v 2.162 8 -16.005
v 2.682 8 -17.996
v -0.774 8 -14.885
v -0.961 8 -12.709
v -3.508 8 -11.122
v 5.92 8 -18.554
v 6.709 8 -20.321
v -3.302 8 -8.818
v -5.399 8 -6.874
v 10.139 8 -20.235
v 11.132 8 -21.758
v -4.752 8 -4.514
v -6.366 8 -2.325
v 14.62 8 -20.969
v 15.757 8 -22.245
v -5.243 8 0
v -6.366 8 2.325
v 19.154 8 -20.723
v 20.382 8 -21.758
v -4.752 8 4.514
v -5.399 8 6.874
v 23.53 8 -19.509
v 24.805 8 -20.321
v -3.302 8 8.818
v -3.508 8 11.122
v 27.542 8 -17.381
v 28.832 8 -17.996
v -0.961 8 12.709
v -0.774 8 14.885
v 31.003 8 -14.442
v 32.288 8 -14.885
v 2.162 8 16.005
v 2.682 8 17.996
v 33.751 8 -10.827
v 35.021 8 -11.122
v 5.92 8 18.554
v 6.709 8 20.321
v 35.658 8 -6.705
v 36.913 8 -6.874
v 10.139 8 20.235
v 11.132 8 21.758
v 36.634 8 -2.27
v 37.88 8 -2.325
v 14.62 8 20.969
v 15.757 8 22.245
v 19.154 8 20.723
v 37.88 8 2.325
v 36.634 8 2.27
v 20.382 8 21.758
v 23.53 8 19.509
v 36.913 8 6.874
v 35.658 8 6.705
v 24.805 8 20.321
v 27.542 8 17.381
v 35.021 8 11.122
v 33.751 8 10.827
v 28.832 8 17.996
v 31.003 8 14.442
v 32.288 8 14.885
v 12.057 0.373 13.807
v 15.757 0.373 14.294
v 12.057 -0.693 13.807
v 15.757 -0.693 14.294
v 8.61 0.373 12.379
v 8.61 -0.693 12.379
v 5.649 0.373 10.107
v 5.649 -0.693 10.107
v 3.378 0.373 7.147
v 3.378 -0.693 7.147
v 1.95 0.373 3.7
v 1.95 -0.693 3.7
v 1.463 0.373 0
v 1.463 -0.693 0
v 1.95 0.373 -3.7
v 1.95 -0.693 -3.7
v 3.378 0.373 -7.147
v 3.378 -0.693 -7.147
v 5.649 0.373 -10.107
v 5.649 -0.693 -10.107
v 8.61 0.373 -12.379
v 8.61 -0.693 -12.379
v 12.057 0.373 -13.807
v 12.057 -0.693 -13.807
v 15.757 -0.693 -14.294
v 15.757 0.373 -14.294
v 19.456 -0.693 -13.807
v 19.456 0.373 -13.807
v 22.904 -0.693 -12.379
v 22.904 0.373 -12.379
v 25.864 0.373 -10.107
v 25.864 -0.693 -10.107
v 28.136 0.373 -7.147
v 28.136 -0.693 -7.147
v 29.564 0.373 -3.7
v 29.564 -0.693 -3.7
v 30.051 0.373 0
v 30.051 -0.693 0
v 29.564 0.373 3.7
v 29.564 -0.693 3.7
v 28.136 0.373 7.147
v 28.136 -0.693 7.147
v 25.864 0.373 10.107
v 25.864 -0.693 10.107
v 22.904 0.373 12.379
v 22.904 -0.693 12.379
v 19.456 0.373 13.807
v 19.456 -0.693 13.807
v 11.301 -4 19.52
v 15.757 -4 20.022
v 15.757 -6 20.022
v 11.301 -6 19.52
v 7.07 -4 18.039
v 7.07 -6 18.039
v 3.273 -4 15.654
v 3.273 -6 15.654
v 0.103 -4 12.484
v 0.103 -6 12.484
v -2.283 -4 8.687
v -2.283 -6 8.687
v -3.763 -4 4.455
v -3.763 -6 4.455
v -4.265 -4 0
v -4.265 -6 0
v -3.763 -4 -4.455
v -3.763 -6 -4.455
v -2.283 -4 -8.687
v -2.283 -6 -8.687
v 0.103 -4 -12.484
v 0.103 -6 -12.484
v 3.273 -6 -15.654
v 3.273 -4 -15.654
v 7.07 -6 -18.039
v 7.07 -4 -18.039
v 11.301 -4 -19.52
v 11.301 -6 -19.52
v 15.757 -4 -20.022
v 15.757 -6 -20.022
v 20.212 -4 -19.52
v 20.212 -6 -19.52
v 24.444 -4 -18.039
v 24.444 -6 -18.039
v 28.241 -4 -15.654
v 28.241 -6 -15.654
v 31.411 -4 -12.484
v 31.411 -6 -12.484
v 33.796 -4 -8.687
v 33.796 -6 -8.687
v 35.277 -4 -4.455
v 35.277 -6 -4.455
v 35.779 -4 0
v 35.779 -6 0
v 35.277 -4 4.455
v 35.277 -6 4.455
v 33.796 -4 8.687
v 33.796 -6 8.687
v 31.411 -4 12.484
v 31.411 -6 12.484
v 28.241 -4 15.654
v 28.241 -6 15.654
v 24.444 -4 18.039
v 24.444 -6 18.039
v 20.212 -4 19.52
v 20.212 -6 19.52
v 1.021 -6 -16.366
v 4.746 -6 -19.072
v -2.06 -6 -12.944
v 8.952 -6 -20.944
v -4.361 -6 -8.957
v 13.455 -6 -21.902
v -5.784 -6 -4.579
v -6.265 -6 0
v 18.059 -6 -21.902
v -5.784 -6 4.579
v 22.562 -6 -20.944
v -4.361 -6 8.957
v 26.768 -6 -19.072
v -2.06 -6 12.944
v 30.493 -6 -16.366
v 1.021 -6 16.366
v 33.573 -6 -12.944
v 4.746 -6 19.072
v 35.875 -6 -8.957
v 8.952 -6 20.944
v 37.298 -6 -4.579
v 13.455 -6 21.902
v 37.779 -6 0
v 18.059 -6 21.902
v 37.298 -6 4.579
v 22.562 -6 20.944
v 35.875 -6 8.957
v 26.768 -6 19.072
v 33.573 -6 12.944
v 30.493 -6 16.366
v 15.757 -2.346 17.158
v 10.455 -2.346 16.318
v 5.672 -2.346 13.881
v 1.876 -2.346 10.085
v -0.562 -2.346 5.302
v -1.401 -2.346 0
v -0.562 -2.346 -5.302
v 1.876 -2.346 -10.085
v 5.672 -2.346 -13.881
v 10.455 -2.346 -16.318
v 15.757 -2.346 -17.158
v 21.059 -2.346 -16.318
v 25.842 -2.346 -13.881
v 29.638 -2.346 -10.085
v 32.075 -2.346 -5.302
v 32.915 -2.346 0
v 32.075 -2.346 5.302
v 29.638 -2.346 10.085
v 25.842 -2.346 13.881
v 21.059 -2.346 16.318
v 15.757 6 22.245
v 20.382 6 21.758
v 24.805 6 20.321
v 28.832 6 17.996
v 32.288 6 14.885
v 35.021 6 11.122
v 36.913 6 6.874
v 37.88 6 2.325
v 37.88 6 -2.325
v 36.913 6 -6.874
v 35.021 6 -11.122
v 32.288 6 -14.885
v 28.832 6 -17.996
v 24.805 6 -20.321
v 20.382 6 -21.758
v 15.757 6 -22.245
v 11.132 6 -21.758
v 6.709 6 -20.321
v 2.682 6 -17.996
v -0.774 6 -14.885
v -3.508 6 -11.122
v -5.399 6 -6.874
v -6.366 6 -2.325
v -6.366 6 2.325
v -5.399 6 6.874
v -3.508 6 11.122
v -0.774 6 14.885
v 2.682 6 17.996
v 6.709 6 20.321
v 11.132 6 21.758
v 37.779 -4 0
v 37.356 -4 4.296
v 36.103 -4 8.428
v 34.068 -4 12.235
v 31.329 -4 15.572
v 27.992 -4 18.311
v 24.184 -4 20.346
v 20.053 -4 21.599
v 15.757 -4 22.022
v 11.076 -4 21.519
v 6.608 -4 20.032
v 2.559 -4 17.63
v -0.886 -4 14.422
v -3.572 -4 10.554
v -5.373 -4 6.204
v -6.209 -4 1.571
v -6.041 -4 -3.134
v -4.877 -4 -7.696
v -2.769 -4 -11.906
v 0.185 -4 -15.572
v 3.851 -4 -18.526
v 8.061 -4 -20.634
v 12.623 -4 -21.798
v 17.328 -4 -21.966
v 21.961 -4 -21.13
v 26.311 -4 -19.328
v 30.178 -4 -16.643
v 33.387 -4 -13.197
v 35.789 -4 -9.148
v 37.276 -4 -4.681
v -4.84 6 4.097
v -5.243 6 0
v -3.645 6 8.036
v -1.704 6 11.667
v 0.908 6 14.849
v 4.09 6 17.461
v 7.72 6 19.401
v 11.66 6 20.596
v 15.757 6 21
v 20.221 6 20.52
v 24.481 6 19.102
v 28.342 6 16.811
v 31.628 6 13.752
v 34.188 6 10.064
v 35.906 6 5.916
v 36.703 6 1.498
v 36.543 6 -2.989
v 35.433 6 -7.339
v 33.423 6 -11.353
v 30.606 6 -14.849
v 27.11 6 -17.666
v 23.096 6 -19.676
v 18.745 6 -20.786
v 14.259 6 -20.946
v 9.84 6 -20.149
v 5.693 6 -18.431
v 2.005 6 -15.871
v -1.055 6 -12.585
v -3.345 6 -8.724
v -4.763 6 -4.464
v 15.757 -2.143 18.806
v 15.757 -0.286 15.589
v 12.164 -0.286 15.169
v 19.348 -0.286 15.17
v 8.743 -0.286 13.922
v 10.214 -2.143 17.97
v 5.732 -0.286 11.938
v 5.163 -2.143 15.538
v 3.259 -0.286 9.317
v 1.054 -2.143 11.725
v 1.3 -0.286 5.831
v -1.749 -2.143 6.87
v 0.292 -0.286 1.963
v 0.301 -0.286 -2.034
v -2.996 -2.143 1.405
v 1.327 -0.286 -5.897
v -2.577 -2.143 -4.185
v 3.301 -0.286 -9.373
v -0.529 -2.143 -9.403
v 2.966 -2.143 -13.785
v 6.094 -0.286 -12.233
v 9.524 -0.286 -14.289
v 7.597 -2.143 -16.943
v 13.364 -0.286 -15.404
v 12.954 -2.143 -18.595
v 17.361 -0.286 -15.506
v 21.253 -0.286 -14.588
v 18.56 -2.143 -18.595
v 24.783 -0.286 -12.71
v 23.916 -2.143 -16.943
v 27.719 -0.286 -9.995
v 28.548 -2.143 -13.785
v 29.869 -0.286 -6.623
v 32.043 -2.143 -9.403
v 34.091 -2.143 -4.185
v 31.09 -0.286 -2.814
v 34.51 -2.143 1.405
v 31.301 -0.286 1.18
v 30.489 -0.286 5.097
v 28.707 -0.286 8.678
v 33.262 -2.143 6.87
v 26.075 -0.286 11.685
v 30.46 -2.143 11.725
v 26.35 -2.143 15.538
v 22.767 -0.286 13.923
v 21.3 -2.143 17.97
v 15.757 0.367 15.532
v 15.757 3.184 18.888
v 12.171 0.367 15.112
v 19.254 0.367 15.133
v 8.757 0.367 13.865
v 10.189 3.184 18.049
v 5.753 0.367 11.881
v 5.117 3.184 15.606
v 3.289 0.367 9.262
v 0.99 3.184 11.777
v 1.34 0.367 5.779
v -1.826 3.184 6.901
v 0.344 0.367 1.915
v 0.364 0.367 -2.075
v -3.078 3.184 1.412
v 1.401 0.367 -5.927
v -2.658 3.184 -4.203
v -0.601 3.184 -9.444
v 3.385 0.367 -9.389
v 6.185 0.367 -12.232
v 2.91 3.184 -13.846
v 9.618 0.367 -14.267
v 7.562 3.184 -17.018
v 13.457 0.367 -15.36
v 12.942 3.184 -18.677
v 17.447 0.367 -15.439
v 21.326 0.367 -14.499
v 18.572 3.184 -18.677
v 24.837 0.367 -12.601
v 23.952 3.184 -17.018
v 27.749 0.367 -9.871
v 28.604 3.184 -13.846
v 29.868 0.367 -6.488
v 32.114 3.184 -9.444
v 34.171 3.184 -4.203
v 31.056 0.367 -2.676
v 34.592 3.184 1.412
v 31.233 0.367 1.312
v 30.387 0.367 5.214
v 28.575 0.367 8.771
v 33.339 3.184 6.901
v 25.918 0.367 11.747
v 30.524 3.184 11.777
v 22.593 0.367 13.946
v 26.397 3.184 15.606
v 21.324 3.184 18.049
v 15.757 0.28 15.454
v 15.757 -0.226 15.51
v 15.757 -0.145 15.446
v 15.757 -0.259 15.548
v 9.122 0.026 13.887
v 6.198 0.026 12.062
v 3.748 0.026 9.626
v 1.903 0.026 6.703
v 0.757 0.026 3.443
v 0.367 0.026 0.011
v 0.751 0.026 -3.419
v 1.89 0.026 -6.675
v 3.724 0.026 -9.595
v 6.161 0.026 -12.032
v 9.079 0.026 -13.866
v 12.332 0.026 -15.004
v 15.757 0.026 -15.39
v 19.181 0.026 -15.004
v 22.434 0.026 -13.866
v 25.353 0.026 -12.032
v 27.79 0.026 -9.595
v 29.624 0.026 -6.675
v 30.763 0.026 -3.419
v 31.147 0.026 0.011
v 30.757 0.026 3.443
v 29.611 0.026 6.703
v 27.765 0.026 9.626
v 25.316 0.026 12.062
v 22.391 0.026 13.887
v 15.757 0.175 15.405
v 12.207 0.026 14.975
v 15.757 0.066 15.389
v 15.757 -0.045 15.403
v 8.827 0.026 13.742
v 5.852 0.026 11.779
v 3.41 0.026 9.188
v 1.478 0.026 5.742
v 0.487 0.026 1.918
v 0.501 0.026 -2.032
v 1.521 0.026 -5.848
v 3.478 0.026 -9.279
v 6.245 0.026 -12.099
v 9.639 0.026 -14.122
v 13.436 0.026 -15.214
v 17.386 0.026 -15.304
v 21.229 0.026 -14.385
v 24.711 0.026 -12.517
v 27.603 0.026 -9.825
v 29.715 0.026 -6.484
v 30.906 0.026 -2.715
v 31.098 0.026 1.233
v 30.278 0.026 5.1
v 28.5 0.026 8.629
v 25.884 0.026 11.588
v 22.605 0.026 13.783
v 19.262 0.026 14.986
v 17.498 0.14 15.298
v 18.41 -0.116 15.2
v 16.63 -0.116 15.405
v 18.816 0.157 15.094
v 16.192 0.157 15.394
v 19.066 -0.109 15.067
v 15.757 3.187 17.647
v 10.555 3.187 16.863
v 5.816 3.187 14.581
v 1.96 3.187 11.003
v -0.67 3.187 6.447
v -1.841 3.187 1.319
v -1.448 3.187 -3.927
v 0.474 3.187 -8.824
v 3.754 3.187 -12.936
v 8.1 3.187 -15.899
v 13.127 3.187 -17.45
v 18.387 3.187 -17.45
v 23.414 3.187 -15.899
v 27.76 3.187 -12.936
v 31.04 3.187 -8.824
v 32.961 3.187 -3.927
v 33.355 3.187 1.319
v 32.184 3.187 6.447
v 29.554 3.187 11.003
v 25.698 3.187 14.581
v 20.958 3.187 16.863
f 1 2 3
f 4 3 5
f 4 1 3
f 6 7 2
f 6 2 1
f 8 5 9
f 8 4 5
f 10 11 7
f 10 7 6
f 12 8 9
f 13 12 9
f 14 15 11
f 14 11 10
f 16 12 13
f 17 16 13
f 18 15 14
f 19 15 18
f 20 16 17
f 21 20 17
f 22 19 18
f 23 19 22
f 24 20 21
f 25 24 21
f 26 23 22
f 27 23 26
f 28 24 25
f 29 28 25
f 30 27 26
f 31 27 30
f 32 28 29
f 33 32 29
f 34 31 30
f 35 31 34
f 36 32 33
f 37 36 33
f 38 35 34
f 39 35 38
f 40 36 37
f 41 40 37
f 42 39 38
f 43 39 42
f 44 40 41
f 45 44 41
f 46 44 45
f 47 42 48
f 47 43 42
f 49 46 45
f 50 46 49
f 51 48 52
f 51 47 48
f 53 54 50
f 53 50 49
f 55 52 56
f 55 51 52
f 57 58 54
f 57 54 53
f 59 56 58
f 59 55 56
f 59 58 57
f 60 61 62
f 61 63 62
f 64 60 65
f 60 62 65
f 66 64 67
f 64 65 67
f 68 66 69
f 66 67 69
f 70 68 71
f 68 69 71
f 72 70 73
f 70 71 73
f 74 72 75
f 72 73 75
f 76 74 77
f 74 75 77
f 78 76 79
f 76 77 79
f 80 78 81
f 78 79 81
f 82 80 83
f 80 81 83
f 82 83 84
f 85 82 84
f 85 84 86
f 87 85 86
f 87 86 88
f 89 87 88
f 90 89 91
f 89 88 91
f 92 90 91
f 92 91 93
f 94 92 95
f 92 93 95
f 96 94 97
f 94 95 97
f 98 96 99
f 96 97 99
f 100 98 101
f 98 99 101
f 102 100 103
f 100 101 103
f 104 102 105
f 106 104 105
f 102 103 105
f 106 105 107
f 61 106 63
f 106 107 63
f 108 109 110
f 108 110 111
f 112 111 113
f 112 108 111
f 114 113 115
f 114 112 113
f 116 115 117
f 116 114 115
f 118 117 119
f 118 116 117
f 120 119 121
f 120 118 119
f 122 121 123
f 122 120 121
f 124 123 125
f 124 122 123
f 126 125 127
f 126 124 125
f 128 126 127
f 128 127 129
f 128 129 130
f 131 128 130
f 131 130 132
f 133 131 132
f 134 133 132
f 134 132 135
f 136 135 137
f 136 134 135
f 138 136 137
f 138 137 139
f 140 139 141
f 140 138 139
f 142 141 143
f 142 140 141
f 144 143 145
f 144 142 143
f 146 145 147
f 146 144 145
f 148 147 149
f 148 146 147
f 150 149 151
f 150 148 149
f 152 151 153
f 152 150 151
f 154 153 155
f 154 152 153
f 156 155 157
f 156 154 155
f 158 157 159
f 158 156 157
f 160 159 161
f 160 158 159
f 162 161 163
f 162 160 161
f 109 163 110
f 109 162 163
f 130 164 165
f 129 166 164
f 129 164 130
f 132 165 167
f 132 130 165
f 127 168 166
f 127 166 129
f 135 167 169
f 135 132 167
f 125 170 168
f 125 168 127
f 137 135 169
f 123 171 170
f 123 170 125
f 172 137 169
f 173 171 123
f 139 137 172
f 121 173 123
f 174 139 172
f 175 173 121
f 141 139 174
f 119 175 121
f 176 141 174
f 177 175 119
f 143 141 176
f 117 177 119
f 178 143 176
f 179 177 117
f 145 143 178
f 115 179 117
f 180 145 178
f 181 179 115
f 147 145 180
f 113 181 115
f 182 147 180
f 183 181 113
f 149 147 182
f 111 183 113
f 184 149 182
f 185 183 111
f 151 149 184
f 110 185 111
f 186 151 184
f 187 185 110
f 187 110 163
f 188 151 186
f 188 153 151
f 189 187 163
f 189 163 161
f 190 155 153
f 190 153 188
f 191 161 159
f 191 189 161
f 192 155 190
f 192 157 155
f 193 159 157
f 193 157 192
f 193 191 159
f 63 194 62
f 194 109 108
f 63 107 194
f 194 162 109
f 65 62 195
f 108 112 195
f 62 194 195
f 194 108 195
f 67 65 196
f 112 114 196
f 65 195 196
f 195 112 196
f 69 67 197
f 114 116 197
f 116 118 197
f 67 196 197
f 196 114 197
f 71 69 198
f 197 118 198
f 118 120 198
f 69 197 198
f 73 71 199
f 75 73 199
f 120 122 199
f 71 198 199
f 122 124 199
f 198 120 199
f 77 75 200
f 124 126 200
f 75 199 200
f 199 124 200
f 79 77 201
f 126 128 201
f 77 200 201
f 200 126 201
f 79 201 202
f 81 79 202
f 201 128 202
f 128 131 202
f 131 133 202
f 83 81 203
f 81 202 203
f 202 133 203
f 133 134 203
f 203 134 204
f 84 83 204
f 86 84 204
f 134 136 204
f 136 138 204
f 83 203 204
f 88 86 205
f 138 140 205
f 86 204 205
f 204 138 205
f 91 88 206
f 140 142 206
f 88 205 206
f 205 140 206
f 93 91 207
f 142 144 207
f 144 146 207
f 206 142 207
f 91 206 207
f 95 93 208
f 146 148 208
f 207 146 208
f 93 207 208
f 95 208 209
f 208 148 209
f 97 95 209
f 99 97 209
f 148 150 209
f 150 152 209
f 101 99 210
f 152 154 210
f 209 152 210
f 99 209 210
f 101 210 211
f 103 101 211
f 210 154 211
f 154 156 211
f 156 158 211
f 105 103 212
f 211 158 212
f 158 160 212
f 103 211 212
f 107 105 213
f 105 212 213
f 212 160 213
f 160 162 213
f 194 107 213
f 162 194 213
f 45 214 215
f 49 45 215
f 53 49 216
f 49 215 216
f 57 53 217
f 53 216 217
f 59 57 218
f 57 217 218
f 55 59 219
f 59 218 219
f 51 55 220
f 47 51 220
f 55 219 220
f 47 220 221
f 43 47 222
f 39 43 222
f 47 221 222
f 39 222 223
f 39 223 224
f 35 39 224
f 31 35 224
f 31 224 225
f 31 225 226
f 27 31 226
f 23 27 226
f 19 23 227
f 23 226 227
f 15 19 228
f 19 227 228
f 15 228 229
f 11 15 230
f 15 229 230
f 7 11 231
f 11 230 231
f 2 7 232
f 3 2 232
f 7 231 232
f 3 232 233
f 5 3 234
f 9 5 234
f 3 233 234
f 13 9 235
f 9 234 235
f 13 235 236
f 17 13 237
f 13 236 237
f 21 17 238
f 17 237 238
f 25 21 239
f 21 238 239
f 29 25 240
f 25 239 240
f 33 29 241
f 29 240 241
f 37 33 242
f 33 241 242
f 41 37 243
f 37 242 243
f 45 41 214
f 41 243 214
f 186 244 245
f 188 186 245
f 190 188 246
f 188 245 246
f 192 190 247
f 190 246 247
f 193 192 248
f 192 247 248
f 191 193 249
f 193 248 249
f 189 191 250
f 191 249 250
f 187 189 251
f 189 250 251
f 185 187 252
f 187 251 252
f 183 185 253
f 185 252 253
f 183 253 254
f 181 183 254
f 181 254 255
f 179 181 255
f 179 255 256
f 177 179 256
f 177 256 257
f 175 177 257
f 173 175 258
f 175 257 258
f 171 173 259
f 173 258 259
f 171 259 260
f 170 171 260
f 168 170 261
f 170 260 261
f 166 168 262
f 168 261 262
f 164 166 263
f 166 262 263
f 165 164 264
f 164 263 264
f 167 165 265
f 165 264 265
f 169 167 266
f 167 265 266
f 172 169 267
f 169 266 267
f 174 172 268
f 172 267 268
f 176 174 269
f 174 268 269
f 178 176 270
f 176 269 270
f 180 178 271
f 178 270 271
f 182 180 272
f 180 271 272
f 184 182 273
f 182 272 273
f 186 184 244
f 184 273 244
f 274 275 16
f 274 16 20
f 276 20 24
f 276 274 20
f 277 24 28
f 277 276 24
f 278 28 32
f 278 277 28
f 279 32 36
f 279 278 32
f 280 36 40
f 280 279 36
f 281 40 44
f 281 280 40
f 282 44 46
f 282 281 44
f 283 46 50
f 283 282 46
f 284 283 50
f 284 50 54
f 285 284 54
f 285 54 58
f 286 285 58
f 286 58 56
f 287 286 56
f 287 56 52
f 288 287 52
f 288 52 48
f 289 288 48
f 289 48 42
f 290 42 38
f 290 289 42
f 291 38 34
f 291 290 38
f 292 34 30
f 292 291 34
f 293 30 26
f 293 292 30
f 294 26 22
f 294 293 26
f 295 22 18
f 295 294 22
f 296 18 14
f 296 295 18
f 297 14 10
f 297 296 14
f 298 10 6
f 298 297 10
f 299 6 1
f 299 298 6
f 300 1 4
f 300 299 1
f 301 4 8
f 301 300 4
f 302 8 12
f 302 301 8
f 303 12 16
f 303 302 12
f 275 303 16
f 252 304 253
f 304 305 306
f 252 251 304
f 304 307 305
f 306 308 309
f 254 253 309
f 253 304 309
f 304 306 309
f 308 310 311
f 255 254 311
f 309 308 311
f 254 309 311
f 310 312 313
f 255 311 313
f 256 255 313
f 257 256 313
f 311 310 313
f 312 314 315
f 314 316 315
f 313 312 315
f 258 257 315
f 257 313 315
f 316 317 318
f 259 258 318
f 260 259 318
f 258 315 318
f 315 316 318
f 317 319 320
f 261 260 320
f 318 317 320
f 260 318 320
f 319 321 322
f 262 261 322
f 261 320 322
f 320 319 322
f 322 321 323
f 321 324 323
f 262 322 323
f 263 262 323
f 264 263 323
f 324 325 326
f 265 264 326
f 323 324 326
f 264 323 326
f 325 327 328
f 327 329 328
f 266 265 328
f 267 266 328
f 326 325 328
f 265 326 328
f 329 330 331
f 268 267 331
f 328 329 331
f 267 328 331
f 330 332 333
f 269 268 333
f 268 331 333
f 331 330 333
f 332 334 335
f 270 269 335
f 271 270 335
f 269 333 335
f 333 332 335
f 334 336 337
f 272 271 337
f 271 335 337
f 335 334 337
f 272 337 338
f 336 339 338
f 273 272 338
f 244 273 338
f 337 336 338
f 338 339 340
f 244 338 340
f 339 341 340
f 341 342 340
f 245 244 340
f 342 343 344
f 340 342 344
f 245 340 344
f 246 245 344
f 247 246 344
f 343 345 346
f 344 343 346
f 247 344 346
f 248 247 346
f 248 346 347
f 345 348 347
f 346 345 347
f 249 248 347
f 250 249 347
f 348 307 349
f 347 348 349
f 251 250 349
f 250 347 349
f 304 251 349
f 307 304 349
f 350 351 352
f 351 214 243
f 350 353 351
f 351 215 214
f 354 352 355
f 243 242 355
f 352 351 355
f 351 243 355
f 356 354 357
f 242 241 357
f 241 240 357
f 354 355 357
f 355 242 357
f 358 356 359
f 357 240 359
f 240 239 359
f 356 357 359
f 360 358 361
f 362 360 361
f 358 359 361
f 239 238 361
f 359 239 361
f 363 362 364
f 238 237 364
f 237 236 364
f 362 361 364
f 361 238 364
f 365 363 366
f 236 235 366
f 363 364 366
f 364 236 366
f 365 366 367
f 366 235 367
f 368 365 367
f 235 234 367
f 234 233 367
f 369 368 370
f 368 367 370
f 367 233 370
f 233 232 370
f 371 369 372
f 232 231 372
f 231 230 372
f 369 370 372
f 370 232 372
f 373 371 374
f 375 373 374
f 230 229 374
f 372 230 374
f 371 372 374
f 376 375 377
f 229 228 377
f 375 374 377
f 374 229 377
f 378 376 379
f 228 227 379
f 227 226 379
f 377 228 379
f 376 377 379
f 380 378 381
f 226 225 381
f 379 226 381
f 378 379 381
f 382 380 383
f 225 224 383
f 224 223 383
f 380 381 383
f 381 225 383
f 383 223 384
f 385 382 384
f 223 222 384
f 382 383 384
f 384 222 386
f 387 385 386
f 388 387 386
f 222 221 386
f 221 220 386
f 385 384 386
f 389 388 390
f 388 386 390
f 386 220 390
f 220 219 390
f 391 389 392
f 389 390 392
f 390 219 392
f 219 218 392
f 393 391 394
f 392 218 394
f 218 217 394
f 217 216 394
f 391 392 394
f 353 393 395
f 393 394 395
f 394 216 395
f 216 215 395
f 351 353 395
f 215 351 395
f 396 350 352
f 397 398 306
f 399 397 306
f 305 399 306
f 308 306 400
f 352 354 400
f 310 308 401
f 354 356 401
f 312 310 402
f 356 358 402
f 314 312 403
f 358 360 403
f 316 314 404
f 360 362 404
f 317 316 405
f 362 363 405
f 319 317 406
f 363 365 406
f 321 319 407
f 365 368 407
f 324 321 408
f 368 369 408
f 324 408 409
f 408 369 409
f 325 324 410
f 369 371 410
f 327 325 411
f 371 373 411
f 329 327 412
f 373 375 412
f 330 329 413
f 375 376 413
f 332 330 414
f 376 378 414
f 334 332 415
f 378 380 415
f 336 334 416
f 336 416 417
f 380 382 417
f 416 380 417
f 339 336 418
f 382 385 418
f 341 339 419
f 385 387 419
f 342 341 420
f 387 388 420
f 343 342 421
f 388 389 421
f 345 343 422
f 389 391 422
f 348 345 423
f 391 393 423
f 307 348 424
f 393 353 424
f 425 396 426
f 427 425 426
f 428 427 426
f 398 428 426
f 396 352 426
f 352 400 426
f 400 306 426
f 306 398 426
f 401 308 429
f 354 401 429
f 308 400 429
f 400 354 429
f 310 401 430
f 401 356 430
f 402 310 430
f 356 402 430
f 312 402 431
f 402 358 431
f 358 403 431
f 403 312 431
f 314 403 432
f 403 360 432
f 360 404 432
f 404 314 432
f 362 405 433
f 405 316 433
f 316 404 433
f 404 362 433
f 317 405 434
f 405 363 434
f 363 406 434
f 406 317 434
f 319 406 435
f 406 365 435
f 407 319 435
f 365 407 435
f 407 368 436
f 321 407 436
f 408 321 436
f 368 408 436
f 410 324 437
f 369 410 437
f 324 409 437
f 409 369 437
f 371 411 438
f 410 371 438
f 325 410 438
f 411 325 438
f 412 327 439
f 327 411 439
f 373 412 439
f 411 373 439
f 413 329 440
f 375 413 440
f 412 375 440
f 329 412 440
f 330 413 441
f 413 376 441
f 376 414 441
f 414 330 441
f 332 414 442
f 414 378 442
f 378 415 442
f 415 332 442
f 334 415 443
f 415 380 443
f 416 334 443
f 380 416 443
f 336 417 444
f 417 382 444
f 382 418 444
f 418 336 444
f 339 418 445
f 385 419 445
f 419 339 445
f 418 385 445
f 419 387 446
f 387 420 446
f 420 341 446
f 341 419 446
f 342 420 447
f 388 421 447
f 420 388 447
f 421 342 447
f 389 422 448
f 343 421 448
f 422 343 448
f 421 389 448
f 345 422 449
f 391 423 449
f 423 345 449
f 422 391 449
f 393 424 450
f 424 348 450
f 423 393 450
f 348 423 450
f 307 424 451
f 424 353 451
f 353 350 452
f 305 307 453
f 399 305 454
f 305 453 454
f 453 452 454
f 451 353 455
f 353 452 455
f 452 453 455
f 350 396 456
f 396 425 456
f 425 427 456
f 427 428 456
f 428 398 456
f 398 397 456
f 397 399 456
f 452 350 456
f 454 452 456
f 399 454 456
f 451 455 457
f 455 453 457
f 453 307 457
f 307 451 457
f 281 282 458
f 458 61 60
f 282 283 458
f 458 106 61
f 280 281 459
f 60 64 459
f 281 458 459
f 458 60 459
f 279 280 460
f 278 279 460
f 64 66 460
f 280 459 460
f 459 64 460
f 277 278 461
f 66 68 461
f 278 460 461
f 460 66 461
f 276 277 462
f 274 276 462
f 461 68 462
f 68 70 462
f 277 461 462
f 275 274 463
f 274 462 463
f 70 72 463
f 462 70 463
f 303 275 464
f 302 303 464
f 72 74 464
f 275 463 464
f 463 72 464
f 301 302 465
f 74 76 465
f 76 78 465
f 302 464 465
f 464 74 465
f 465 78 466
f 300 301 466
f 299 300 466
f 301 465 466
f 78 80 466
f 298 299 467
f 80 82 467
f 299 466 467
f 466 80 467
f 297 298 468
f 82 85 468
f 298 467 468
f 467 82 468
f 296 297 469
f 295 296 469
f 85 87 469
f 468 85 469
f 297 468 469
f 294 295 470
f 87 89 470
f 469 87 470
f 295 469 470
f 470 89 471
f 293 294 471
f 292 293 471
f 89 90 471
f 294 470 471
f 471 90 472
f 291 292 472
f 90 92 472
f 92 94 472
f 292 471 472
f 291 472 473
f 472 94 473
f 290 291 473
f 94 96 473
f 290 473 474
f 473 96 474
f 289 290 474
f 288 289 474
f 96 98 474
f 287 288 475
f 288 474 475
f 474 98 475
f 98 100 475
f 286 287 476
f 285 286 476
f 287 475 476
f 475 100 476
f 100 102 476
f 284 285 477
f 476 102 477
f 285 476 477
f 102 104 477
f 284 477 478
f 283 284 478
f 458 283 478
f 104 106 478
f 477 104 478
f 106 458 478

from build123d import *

# Parameters (mm, degrees)
FILLET2_R           = 0.4
SKETCH2_R           = 22.244579061
SKETCH2_R_2         = 21
BOSS_EXTRUDE1_DEPTH = 2
SKETCH3_R           = 22.022260736
SKETCH3_R_2         = 20.022260736
BOSS_EXTRUDE2_DEPTH = 2


with BuildPart() as part:
    # Sketch1 → Revolve1 (revolve)
    with BuildSketch(Plane.XY, mode=Mode.PRIVATE) as revolve1_sk:
        Polygon((0.662781953, 0), (-6.487739603, 6), (-5.243160541, 6), (1.462781953, 0.373046127), (1.462781953, -0.692820323), (-4.265421278, -4), (-6.265421278, -4), align=None)
    revolve(revolve1_sk.sketch.rotate(Axis((15.756839459, 5.609018033, 0), (0, -1, 0)), 270), axis=Axis((15.756839459, 5.609018033, 0), (0, -1, 0)))

    # Fillet2
    fillet2_edges = [part.edges().sort_by_distance(p)[0] for p in [
        (15.756839459, 0, -15.094057506),
    ]]
    fillet(fillet2_edges, radius=FILLET2_R)

    # Sketch2 → Boss-Extrude1 (add)
    with BuildSketch(Plane(origin=(0, 6, 0), x_dir=(1, 0, 0), z_dir=(0, 1, 0))):
        with Locations(Location((15.756839459, 0, 0), (0, 0, 270))):
            Circle(SKETCH2_R)
        with Locations(Location((15.756839459, 0, 0), (0, 0, 180))):
            Circle(SKETCH2_R_2, mode=Mode.SUBTRACT)
    extrude(amount=BOSS_EXTRUDE1_DEPTH)

    # Sketch3 → Boss-Extrude2 (add)
    with BuildSketch(Plane.XZ.offset(4)):
        with Locations((15.756839459, 0)):
            Circle(SKETCH3_R)
        with Locations(Location((15.756839459, 0, 0), (0, 0, 90))):
            Circle(SKETCH3_R_2, mode=Mode.SUBTRACT)
    extrude(amount=BOSS_EXTRUDE2_DEPTH)


solid = part.part
